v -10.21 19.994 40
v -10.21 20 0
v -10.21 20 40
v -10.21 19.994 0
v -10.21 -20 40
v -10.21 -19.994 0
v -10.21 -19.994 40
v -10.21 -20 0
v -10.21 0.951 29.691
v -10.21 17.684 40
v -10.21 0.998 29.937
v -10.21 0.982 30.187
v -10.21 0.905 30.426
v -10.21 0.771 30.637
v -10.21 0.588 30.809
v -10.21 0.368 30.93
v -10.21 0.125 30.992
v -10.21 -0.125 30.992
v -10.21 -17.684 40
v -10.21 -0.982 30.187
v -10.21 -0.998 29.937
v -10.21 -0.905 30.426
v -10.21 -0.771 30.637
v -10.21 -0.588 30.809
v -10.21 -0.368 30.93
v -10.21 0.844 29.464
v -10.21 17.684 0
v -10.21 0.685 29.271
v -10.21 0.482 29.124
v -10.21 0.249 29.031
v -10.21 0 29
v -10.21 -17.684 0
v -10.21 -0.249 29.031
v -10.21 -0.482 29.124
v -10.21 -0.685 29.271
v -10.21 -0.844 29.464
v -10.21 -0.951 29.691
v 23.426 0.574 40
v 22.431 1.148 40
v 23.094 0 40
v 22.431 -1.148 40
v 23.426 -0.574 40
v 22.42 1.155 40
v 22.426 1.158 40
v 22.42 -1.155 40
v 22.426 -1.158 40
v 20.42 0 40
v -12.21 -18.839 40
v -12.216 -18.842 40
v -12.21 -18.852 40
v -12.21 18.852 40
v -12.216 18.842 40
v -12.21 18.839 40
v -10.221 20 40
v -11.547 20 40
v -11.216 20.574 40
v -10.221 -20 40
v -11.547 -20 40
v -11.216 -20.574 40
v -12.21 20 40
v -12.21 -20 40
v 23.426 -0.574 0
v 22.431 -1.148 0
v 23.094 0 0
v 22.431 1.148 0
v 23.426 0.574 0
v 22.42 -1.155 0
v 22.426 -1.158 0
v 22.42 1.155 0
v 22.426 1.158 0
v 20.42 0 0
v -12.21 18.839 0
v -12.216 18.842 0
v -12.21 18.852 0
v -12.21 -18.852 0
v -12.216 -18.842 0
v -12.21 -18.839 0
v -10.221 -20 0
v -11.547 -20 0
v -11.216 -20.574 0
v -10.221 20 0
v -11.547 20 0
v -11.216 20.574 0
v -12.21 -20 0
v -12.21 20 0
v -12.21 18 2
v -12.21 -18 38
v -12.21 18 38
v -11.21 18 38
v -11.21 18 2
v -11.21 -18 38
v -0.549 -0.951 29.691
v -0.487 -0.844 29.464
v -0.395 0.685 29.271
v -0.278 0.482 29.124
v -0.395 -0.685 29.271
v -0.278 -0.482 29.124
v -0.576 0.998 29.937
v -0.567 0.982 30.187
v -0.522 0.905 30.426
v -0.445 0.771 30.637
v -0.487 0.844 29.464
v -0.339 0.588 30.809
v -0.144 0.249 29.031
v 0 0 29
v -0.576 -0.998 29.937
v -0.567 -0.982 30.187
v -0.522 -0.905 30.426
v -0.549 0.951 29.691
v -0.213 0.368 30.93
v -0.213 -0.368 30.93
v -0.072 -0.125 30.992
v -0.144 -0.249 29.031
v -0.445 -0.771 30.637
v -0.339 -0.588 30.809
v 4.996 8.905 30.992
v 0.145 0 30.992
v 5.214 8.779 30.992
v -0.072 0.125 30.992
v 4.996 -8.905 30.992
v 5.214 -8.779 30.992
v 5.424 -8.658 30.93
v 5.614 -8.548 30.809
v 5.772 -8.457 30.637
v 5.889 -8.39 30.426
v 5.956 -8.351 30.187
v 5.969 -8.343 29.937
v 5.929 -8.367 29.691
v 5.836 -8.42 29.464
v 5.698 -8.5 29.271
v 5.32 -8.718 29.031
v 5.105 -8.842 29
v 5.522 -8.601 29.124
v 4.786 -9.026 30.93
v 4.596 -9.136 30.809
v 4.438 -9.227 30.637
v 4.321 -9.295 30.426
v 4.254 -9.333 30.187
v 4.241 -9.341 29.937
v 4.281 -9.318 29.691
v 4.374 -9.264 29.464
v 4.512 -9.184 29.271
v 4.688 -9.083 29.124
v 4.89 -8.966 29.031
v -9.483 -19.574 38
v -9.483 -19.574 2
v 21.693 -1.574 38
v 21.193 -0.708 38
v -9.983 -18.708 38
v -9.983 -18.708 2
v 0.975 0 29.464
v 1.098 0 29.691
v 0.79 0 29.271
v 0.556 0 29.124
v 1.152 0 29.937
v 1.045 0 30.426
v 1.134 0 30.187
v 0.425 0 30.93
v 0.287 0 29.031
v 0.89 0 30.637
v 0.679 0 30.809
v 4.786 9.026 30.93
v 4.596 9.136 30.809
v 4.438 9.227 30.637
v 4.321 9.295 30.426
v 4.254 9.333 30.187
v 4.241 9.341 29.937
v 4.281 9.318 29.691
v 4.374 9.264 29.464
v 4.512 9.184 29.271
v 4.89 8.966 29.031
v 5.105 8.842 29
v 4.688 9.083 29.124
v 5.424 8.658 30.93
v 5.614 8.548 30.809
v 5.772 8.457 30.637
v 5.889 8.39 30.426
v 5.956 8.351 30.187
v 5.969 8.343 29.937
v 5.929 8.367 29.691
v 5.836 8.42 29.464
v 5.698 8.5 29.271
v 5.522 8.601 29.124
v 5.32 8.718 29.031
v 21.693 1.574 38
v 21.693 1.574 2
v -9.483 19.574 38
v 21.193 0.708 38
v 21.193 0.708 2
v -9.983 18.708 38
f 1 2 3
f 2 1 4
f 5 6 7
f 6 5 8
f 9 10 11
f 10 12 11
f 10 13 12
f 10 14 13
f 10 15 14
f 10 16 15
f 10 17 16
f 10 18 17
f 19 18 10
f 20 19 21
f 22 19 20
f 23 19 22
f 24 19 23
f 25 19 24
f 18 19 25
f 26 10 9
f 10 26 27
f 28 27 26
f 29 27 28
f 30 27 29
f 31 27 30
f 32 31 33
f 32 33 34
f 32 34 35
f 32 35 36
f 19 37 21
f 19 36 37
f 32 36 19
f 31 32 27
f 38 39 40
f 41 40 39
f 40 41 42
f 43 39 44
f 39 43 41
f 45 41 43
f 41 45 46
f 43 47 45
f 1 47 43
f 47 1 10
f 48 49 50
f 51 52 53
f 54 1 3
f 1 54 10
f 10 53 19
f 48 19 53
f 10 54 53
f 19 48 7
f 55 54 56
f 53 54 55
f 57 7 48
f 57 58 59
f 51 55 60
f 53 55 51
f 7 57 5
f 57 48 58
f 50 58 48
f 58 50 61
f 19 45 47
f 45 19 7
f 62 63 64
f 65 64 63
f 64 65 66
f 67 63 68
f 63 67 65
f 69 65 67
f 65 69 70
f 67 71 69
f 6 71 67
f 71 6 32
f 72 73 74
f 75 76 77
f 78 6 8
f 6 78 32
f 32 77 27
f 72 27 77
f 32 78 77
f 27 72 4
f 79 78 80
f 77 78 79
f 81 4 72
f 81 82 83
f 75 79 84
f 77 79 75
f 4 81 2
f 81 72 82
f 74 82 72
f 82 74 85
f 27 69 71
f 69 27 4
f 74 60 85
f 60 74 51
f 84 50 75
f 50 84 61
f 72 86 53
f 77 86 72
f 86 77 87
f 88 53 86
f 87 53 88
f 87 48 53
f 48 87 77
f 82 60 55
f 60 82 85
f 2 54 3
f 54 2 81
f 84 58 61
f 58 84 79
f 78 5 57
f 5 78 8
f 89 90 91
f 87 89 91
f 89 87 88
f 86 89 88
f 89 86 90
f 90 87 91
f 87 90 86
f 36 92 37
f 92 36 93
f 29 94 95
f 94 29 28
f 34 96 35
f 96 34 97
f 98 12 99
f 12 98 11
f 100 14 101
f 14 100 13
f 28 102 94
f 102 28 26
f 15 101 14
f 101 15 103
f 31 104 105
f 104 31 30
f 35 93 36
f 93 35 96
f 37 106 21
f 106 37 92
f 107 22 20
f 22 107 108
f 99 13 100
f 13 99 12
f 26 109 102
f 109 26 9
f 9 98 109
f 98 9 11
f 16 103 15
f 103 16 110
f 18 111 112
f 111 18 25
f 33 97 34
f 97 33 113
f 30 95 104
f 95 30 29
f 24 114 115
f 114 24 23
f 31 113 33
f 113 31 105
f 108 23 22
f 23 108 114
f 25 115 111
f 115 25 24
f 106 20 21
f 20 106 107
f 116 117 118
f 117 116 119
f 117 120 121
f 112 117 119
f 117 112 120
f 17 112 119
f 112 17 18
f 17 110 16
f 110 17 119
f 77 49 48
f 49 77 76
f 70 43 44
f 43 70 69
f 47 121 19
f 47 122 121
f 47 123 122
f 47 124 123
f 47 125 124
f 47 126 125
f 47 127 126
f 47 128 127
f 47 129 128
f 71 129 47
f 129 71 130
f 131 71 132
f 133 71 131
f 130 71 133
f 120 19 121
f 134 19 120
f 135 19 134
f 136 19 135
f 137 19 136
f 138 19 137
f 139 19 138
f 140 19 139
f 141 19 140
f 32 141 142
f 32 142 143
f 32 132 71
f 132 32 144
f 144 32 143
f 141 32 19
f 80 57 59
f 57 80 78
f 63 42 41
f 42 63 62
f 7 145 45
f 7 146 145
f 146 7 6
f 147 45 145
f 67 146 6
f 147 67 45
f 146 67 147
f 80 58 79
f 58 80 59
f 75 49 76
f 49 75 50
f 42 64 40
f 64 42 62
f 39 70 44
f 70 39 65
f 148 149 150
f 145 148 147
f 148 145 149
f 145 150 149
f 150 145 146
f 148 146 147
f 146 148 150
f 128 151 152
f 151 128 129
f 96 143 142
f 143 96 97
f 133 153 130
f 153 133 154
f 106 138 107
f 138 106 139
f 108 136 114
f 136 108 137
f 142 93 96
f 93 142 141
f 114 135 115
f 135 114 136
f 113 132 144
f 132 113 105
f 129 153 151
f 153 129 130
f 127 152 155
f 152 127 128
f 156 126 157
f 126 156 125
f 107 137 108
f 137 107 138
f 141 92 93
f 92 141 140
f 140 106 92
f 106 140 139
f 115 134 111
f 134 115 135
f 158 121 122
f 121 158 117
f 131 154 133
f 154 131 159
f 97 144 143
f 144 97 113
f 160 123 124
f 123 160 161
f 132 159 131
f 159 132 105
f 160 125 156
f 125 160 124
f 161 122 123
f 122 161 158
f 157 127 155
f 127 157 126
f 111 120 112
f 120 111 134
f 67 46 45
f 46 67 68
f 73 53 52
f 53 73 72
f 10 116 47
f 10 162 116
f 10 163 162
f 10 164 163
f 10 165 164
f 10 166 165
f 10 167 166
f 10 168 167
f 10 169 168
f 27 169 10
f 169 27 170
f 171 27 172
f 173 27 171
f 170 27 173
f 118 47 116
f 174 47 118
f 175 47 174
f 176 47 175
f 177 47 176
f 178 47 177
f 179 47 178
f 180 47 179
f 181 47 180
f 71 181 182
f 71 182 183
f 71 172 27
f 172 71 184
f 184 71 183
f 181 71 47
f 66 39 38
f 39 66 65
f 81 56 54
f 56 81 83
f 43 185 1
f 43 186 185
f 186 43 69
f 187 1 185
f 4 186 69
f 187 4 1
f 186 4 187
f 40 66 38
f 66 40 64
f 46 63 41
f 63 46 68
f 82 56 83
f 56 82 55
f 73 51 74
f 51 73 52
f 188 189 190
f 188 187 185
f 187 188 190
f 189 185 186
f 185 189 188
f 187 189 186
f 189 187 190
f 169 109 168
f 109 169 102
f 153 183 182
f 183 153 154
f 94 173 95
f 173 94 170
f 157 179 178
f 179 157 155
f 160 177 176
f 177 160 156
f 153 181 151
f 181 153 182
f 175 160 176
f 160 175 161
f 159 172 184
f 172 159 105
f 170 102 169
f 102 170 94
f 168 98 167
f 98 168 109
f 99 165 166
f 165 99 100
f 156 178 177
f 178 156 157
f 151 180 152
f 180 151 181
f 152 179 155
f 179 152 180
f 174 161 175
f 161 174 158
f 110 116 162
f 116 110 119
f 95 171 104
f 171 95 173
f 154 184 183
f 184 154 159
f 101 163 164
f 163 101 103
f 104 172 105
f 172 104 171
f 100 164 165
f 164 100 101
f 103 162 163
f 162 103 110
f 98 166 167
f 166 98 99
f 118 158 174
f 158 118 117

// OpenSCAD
$fn = 25;

module prism(l, w, h){
	polyhedron(
			points=[[0,0,0], [l,0,0], [l,w,0], [0,w,0], [0,w,h], [l,w,h]],
			faces=[[0,1,2,3],[5,4,3,2],[0,4,5,1],[0,3,4],[5,2,1]]
			);
	}

for (i = [0:120:240]) {
	rotate([0, 0, i]) {
		// sticks in the middle
		translate([-11, 0, 30]) rotate([0, 90, 0]) cylinder(r=1, h=11);
		// one side
		translate([-12.21, -20, 0]) {
			difference() {
				cube([2, 40, 40]);
				translate([0, 2, 2]) cube([1, 36, 36]);
			}
			translate([1, 38, 2]) rotate ([0, 0, 180]) prism(1, 36, 36);
		}
	}
}
